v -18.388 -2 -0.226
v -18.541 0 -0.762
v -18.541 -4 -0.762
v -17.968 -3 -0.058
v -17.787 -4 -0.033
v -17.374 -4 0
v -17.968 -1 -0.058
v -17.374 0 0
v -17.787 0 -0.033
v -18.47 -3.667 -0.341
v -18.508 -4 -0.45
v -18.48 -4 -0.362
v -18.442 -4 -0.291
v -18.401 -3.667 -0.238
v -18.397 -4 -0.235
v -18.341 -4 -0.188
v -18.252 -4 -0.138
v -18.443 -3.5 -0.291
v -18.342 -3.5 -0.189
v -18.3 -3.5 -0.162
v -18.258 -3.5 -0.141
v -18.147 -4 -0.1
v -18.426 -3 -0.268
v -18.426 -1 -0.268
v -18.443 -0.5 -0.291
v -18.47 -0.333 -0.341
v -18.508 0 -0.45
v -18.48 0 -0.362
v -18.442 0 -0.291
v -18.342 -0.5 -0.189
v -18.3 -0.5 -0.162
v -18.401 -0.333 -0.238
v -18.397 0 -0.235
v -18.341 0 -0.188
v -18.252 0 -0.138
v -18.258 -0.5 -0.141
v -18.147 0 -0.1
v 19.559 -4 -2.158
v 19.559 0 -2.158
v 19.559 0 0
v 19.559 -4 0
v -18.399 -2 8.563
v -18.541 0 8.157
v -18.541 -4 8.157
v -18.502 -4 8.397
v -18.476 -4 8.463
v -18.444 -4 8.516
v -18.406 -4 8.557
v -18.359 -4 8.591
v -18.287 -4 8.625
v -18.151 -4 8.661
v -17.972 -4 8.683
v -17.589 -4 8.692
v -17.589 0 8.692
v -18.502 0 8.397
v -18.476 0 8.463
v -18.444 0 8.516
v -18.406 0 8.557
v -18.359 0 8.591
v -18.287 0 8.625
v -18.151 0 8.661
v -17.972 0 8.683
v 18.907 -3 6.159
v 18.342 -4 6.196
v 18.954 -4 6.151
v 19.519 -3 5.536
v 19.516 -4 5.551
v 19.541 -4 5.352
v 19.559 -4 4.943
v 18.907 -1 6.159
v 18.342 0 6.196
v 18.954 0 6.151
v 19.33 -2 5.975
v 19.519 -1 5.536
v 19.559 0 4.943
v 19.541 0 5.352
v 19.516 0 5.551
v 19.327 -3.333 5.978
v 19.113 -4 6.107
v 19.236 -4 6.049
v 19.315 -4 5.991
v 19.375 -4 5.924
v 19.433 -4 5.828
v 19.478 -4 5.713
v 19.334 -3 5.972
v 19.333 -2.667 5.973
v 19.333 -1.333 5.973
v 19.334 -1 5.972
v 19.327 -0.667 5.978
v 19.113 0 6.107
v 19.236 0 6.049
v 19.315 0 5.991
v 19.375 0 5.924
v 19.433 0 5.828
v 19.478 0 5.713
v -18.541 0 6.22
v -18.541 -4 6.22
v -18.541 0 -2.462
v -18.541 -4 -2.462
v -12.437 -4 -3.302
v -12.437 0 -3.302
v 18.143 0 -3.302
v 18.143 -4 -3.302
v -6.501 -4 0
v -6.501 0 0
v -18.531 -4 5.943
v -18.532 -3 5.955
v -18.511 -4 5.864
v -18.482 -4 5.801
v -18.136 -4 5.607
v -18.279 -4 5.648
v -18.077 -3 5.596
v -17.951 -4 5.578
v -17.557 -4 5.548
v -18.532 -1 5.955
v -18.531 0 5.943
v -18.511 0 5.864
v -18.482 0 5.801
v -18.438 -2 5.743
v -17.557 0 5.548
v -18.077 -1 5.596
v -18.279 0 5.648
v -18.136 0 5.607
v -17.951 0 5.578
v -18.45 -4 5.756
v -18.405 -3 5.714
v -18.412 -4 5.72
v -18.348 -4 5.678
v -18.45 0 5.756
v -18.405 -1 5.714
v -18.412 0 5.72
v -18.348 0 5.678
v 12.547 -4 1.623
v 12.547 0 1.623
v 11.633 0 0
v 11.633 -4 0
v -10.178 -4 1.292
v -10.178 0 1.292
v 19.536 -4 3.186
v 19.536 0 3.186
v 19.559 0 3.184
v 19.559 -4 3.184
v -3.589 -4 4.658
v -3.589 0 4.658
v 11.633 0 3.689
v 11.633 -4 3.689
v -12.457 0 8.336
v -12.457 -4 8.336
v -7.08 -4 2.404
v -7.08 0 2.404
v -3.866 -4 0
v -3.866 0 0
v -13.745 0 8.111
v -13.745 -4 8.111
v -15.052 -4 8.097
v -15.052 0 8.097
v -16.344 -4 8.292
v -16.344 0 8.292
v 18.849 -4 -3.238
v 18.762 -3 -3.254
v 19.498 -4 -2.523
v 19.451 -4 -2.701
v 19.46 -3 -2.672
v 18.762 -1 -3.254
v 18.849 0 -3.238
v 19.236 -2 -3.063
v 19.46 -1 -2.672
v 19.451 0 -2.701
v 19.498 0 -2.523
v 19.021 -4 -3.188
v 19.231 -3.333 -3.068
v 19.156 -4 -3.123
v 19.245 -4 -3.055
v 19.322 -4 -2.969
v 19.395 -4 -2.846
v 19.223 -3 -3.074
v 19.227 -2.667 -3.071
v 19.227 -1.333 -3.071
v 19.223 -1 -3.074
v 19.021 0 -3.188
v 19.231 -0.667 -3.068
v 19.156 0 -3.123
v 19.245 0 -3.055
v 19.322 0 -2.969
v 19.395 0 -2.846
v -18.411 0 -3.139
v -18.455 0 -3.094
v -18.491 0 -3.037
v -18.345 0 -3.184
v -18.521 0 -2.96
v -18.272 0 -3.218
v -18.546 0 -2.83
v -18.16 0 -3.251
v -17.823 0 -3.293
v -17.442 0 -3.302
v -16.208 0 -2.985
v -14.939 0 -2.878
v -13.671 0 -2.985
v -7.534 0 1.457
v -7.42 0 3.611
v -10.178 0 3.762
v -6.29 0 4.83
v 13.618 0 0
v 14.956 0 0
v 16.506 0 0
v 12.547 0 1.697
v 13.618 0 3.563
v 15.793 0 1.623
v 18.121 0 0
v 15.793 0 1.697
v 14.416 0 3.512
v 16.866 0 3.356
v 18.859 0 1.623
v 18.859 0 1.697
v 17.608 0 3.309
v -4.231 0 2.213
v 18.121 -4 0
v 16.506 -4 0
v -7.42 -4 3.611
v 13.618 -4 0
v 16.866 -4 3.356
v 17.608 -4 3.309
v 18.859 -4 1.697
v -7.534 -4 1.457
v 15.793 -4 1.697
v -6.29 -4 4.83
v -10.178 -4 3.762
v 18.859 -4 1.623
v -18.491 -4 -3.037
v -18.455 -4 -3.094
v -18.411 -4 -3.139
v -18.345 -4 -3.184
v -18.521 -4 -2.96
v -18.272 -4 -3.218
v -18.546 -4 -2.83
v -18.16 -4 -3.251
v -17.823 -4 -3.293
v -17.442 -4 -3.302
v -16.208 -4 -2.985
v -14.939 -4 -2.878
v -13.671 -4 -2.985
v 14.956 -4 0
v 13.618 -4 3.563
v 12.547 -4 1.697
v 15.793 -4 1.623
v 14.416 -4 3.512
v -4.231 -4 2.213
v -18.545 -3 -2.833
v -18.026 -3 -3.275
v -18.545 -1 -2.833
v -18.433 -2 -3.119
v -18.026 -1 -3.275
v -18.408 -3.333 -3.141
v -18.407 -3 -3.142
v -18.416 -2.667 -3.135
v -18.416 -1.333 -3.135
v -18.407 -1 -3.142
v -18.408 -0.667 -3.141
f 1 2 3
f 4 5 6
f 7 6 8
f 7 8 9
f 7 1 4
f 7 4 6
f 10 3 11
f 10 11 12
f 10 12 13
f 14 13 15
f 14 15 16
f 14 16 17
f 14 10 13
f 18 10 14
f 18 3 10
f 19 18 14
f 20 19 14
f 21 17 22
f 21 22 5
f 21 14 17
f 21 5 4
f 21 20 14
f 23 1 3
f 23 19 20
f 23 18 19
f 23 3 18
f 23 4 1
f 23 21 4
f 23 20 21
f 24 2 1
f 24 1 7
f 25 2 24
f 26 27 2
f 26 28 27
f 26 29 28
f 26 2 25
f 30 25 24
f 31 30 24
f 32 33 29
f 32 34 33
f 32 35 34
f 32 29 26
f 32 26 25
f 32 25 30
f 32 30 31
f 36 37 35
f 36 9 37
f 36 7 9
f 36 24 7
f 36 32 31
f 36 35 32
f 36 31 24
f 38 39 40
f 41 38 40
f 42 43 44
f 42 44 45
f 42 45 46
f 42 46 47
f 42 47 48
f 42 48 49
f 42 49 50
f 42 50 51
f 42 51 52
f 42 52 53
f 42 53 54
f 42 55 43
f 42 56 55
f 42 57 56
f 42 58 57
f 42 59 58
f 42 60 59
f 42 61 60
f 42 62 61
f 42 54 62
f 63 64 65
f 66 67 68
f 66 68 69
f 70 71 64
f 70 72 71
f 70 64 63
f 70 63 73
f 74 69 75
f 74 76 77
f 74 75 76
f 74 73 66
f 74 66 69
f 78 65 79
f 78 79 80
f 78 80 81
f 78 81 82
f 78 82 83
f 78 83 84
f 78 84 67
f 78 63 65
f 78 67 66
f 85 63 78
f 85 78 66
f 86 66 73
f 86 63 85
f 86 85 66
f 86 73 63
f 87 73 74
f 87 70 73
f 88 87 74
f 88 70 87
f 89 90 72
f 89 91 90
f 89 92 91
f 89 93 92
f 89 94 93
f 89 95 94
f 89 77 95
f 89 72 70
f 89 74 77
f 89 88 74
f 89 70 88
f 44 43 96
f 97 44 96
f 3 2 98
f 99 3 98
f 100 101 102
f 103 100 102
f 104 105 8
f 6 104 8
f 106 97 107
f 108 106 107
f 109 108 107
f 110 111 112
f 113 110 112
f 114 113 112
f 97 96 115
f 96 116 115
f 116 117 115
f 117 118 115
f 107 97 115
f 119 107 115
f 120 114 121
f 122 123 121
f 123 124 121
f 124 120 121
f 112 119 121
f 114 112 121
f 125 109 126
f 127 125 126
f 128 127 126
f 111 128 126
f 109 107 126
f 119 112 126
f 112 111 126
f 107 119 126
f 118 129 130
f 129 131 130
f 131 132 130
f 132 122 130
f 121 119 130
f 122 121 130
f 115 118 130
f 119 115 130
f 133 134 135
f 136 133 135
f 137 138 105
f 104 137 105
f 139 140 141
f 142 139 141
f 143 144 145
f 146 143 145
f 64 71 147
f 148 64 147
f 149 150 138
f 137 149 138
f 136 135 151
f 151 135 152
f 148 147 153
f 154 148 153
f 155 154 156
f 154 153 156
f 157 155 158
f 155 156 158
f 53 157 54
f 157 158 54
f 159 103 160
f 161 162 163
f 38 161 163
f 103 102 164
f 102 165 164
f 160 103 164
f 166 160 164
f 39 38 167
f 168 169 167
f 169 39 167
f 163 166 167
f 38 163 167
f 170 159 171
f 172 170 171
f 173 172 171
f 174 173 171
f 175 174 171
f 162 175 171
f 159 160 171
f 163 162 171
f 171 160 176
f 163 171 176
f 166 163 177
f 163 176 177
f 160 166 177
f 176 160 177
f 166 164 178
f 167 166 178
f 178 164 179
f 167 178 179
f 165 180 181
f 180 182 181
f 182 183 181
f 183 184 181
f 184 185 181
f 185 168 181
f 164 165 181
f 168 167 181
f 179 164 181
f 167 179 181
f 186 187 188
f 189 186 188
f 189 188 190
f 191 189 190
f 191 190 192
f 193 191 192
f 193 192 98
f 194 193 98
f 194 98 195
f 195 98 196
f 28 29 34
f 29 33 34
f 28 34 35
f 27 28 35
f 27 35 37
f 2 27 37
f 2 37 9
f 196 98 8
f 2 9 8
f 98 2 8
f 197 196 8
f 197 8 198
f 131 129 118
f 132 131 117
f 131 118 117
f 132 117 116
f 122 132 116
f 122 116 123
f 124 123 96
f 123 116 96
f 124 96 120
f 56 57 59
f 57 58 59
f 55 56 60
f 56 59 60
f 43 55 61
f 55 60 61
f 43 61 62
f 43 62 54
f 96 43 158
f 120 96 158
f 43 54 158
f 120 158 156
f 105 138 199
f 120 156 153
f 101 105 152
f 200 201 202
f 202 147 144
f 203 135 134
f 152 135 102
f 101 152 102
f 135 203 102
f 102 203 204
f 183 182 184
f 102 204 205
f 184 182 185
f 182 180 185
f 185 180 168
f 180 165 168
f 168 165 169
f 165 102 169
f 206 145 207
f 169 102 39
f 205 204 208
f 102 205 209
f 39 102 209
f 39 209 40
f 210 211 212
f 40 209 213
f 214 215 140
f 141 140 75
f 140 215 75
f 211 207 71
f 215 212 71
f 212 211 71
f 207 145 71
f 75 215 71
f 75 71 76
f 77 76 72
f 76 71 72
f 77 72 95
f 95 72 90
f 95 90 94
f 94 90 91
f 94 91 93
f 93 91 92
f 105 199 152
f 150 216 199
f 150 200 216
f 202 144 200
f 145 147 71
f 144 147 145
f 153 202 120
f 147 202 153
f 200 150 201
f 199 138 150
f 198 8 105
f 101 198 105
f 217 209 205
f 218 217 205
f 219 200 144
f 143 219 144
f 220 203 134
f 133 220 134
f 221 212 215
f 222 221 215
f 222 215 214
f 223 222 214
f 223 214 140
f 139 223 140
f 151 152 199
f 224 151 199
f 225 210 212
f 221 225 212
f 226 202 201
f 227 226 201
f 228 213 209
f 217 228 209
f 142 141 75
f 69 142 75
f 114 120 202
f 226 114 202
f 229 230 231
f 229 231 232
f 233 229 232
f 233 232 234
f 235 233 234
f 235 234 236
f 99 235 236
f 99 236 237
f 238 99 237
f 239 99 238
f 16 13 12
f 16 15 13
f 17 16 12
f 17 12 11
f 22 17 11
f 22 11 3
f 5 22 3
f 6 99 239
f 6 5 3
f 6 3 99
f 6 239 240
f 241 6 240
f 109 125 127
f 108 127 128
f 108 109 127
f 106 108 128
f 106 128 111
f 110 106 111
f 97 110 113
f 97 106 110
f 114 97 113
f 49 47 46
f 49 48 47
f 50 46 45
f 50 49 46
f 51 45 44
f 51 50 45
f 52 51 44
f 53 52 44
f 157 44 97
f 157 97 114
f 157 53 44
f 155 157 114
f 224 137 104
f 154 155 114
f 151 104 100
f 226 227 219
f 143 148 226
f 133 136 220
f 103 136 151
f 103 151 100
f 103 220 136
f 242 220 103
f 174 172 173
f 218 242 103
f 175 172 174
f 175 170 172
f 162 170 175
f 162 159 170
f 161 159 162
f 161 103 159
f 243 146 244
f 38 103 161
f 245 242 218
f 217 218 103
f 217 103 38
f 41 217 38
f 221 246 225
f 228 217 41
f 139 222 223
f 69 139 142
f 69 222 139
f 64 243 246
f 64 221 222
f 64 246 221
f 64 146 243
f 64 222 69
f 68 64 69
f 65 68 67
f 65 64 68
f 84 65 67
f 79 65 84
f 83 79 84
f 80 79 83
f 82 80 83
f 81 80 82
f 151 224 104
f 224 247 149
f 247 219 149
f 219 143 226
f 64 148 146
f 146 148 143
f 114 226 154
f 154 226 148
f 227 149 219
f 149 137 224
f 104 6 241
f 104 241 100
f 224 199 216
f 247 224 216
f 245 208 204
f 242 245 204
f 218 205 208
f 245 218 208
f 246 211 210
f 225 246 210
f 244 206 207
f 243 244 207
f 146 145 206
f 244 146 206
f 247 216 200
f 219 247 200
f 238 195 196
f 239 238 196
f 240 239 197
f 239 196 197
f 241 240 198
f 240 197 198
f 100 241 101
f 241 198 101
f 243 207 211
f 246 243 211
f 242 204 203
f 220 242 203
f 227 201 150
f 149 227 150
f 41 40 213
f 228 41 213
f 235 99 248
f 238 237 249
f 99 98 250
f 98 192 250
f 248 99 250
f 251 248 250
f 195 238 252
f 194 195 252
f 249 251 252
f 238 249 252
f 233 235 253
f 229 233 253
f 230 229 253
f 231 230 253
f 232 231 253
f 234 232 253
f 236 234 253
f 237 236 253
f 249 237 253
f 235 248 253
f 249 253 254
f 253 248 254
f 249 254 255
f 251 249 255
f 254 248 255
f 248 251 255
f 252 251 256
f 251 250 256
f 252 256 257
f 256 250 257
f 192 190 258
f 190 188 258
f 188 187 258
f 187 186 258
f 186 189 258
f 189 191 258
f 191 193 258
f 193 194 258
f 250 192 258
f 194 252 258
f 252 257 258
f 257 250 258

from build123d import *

# Parameters (mm, degrees)
F1_DEPTH = 4


with BuildPart() as f1:
    # F0 (on Front) → F1 (new body)
    with BuildSketch(Plane.XZ):
        Polygon((18.1212967897, 0), (19.5590760559, 0), (18.8588984311, 1.6234545037), align=None)
        with BuildLine():
            Line((19.5590760559, -2.1580299363), (19.5590760559, 0))
            Line((19.5590760559, 0), (18.1212967897, 0))
            Line((18.1212967897, 0), (16.5056623518, 0))
            Line((16.5056623518, 0), (14.9563110818, 0))
            Line((14.9563110818, 0), (13.6181200498, 0))
            Line((13.6181200498, 0), (11.6327671148, 0))
            Line((11.6327671148, 0), (-3.8659593556, 0))
            Line((-3.8659593556, 0), (-6.5012451862, 0))
            Line((-6.5012451862, 0), (-17.3736400902, 0))
            add(Edge.make_bspline(
                [(-18.5409239441, -0.7620579563), (-18.5313819873, -0.5570340705), (-18.5088219152, -0.0722955878), (-17.7890049244, -0.0264530705), (-17.3736400902, 0)],
                knots=[0, 0, 0, 0, 0.4229577248, 1, 1, 1, 1], degree=3))
            Line((-18.5409239441, -0.7620579563), (-18.5409239441, -2.4619437754))
            add(Edge.make_bspline(
                [(-18.5409239441, -2.4619437754), (-18.5568826251, -2.7188473012), (-18.5924766066, -3.2918407312), (-17.8507141613, -3.2983881425), (-17.4415233956, -3.302)],
                knots=[0, 0, 0, 0, 0.4483533532, 1, 1, 1, 1], degree=3))
            ThreePointArc((-17.4415233956, -3.302), (-14.9394255131, -2.8779800495), (-12.4373276307, -3.302))
            Line((-12.4373276307, -3.302), (18.1434545666, -3.302))
            add(Edge.make_bspline(
                [(18.1434545666, -3.302), (18.5720487525, -3.2862632294), (19.3979681291, -3.2559377976), (19.5067461789, -2.5146441916), (19.5590760559, -2.1580299363)],
                knots=[0, 0, 0, 0, 0.5189298108, 1, 1, 1, 1], degree=3))
        make_face()
        Polygon((14.9563110818, 0), (16.5056623518, 0), (15.792561695, 1.6234545037), align=None)
        Polygon((11.6327671148, 0), (13.6181200498, 0), (12.546707876, 1.6234545037), align=None)
        Polygon((-6.5012451862, 0), (-3.8659593556, 0), (-7.5336750597, 1.4574349625), (-4.2313374579, 2.2132038139), (-7.4203494005, 3.6106230691), (-3.5889614675, 4.6581615955), (-6.2896457049, 4.8301138928), (-10.1779419929, 3.7617245689), (-7.0804748294, 2.40442007), (-10.1779419929, 1.2916467484), align=None)
        with BuildLine():
            Line((-6.2896457049, 4.8301138928), (-3.5889614675, 4.6581615955))
            Line((-3.5889614675, 4.6581615955), (11.6327671148, 3.6889956474))
            Line((11.6327671148, 3.6889956474), (13.6181200498, 3.5625884231))
            Line((13.6181200498, 3.5625884231), (14.4155324855, 3.5118172525))
            Line((14.4155324855, 3.5118172525), (16.8658798656, 3.355803878))
            Line((16.8658798656, 3.355803878), (17.6075737409, 3.3085803026))
            Line((17.6075737409, 3.3085803026), (19.5355117321, 3.185828682))
            Line((19.5355117321, 3.185828682), (19.5590760559, 3.1843283439))
            Line((19.5590760559, 3.1843283439), (19.5590760559, 4.9431086518))
            add(Edge.make_bspline(
                [(18.3420831283, 6.1964309278), (18.7345885657, 6.1878547056), (19.5281427506, 6.1705155904), (19.5486912134, 5.3551702683), (19.5590760559, 4.9431086518)],
                knots=[0, 0, 0, 0, 0.4946170594, 1, 1, 1, 1], degree=3))
            Line((18.3420831283, 6.1964309278), (-12.4568440589, 8.3355969669))
            ThreePointArc((-12.4568440589, 8.3355969669), (-15.0516657643, 8.0968521777), (-17.5885669887, 8.692025207))
            add(Edge.make_bspline(
                [(-18.5409239441, 8.1570418552), (-18.5248625182, 8.314252707), (-18.4866086391, 8.6886855231), (-17.9182767751, 8.6907990651), (-17.5885669887, 8.692025207)],
                knots=[0, 0, 0, 0, 0.4198639786, 1, 1, 1, 1], degree=3))
            Line((-18.5409239441, 8.1570418552), (-18.5409239441, 6.2195211649))
            add(Edge.make_bspline(
                [(-18.5409239441, 6.2195211649), (-18.5449199509, 6.03695186), (-18.5543470455, 5.6062473591), (-17.9217358709, 5.568988424), (-17.5572792713, 5.5475230036)],
                knots=[0, 0, 0, 0, 0.4238852961, 1, 1, 1, 1], degree=3))
            Line((-17.5572792713, 5.5475230036), (-6.2896457049, 4.8301138928))
        make_face()
        Polygon((13.6181200498, 3.5625884231), (11.6327671148, 3.6889956474), (12.546707876, 1.6966089606), align=None)
        Polygon((16.8658798656, 3.355803878), (14.4155324855, 3.5118172525), (15.792561695, 1.6966089606), align=None)
        Polygon((19.5355117321, 3.185828682), (17.6075737409, 3.3085803026), (18.8588984311, 1.6966089606), align=None)
    extrude(amount=F1_DEPTH)


solid = f1.part
